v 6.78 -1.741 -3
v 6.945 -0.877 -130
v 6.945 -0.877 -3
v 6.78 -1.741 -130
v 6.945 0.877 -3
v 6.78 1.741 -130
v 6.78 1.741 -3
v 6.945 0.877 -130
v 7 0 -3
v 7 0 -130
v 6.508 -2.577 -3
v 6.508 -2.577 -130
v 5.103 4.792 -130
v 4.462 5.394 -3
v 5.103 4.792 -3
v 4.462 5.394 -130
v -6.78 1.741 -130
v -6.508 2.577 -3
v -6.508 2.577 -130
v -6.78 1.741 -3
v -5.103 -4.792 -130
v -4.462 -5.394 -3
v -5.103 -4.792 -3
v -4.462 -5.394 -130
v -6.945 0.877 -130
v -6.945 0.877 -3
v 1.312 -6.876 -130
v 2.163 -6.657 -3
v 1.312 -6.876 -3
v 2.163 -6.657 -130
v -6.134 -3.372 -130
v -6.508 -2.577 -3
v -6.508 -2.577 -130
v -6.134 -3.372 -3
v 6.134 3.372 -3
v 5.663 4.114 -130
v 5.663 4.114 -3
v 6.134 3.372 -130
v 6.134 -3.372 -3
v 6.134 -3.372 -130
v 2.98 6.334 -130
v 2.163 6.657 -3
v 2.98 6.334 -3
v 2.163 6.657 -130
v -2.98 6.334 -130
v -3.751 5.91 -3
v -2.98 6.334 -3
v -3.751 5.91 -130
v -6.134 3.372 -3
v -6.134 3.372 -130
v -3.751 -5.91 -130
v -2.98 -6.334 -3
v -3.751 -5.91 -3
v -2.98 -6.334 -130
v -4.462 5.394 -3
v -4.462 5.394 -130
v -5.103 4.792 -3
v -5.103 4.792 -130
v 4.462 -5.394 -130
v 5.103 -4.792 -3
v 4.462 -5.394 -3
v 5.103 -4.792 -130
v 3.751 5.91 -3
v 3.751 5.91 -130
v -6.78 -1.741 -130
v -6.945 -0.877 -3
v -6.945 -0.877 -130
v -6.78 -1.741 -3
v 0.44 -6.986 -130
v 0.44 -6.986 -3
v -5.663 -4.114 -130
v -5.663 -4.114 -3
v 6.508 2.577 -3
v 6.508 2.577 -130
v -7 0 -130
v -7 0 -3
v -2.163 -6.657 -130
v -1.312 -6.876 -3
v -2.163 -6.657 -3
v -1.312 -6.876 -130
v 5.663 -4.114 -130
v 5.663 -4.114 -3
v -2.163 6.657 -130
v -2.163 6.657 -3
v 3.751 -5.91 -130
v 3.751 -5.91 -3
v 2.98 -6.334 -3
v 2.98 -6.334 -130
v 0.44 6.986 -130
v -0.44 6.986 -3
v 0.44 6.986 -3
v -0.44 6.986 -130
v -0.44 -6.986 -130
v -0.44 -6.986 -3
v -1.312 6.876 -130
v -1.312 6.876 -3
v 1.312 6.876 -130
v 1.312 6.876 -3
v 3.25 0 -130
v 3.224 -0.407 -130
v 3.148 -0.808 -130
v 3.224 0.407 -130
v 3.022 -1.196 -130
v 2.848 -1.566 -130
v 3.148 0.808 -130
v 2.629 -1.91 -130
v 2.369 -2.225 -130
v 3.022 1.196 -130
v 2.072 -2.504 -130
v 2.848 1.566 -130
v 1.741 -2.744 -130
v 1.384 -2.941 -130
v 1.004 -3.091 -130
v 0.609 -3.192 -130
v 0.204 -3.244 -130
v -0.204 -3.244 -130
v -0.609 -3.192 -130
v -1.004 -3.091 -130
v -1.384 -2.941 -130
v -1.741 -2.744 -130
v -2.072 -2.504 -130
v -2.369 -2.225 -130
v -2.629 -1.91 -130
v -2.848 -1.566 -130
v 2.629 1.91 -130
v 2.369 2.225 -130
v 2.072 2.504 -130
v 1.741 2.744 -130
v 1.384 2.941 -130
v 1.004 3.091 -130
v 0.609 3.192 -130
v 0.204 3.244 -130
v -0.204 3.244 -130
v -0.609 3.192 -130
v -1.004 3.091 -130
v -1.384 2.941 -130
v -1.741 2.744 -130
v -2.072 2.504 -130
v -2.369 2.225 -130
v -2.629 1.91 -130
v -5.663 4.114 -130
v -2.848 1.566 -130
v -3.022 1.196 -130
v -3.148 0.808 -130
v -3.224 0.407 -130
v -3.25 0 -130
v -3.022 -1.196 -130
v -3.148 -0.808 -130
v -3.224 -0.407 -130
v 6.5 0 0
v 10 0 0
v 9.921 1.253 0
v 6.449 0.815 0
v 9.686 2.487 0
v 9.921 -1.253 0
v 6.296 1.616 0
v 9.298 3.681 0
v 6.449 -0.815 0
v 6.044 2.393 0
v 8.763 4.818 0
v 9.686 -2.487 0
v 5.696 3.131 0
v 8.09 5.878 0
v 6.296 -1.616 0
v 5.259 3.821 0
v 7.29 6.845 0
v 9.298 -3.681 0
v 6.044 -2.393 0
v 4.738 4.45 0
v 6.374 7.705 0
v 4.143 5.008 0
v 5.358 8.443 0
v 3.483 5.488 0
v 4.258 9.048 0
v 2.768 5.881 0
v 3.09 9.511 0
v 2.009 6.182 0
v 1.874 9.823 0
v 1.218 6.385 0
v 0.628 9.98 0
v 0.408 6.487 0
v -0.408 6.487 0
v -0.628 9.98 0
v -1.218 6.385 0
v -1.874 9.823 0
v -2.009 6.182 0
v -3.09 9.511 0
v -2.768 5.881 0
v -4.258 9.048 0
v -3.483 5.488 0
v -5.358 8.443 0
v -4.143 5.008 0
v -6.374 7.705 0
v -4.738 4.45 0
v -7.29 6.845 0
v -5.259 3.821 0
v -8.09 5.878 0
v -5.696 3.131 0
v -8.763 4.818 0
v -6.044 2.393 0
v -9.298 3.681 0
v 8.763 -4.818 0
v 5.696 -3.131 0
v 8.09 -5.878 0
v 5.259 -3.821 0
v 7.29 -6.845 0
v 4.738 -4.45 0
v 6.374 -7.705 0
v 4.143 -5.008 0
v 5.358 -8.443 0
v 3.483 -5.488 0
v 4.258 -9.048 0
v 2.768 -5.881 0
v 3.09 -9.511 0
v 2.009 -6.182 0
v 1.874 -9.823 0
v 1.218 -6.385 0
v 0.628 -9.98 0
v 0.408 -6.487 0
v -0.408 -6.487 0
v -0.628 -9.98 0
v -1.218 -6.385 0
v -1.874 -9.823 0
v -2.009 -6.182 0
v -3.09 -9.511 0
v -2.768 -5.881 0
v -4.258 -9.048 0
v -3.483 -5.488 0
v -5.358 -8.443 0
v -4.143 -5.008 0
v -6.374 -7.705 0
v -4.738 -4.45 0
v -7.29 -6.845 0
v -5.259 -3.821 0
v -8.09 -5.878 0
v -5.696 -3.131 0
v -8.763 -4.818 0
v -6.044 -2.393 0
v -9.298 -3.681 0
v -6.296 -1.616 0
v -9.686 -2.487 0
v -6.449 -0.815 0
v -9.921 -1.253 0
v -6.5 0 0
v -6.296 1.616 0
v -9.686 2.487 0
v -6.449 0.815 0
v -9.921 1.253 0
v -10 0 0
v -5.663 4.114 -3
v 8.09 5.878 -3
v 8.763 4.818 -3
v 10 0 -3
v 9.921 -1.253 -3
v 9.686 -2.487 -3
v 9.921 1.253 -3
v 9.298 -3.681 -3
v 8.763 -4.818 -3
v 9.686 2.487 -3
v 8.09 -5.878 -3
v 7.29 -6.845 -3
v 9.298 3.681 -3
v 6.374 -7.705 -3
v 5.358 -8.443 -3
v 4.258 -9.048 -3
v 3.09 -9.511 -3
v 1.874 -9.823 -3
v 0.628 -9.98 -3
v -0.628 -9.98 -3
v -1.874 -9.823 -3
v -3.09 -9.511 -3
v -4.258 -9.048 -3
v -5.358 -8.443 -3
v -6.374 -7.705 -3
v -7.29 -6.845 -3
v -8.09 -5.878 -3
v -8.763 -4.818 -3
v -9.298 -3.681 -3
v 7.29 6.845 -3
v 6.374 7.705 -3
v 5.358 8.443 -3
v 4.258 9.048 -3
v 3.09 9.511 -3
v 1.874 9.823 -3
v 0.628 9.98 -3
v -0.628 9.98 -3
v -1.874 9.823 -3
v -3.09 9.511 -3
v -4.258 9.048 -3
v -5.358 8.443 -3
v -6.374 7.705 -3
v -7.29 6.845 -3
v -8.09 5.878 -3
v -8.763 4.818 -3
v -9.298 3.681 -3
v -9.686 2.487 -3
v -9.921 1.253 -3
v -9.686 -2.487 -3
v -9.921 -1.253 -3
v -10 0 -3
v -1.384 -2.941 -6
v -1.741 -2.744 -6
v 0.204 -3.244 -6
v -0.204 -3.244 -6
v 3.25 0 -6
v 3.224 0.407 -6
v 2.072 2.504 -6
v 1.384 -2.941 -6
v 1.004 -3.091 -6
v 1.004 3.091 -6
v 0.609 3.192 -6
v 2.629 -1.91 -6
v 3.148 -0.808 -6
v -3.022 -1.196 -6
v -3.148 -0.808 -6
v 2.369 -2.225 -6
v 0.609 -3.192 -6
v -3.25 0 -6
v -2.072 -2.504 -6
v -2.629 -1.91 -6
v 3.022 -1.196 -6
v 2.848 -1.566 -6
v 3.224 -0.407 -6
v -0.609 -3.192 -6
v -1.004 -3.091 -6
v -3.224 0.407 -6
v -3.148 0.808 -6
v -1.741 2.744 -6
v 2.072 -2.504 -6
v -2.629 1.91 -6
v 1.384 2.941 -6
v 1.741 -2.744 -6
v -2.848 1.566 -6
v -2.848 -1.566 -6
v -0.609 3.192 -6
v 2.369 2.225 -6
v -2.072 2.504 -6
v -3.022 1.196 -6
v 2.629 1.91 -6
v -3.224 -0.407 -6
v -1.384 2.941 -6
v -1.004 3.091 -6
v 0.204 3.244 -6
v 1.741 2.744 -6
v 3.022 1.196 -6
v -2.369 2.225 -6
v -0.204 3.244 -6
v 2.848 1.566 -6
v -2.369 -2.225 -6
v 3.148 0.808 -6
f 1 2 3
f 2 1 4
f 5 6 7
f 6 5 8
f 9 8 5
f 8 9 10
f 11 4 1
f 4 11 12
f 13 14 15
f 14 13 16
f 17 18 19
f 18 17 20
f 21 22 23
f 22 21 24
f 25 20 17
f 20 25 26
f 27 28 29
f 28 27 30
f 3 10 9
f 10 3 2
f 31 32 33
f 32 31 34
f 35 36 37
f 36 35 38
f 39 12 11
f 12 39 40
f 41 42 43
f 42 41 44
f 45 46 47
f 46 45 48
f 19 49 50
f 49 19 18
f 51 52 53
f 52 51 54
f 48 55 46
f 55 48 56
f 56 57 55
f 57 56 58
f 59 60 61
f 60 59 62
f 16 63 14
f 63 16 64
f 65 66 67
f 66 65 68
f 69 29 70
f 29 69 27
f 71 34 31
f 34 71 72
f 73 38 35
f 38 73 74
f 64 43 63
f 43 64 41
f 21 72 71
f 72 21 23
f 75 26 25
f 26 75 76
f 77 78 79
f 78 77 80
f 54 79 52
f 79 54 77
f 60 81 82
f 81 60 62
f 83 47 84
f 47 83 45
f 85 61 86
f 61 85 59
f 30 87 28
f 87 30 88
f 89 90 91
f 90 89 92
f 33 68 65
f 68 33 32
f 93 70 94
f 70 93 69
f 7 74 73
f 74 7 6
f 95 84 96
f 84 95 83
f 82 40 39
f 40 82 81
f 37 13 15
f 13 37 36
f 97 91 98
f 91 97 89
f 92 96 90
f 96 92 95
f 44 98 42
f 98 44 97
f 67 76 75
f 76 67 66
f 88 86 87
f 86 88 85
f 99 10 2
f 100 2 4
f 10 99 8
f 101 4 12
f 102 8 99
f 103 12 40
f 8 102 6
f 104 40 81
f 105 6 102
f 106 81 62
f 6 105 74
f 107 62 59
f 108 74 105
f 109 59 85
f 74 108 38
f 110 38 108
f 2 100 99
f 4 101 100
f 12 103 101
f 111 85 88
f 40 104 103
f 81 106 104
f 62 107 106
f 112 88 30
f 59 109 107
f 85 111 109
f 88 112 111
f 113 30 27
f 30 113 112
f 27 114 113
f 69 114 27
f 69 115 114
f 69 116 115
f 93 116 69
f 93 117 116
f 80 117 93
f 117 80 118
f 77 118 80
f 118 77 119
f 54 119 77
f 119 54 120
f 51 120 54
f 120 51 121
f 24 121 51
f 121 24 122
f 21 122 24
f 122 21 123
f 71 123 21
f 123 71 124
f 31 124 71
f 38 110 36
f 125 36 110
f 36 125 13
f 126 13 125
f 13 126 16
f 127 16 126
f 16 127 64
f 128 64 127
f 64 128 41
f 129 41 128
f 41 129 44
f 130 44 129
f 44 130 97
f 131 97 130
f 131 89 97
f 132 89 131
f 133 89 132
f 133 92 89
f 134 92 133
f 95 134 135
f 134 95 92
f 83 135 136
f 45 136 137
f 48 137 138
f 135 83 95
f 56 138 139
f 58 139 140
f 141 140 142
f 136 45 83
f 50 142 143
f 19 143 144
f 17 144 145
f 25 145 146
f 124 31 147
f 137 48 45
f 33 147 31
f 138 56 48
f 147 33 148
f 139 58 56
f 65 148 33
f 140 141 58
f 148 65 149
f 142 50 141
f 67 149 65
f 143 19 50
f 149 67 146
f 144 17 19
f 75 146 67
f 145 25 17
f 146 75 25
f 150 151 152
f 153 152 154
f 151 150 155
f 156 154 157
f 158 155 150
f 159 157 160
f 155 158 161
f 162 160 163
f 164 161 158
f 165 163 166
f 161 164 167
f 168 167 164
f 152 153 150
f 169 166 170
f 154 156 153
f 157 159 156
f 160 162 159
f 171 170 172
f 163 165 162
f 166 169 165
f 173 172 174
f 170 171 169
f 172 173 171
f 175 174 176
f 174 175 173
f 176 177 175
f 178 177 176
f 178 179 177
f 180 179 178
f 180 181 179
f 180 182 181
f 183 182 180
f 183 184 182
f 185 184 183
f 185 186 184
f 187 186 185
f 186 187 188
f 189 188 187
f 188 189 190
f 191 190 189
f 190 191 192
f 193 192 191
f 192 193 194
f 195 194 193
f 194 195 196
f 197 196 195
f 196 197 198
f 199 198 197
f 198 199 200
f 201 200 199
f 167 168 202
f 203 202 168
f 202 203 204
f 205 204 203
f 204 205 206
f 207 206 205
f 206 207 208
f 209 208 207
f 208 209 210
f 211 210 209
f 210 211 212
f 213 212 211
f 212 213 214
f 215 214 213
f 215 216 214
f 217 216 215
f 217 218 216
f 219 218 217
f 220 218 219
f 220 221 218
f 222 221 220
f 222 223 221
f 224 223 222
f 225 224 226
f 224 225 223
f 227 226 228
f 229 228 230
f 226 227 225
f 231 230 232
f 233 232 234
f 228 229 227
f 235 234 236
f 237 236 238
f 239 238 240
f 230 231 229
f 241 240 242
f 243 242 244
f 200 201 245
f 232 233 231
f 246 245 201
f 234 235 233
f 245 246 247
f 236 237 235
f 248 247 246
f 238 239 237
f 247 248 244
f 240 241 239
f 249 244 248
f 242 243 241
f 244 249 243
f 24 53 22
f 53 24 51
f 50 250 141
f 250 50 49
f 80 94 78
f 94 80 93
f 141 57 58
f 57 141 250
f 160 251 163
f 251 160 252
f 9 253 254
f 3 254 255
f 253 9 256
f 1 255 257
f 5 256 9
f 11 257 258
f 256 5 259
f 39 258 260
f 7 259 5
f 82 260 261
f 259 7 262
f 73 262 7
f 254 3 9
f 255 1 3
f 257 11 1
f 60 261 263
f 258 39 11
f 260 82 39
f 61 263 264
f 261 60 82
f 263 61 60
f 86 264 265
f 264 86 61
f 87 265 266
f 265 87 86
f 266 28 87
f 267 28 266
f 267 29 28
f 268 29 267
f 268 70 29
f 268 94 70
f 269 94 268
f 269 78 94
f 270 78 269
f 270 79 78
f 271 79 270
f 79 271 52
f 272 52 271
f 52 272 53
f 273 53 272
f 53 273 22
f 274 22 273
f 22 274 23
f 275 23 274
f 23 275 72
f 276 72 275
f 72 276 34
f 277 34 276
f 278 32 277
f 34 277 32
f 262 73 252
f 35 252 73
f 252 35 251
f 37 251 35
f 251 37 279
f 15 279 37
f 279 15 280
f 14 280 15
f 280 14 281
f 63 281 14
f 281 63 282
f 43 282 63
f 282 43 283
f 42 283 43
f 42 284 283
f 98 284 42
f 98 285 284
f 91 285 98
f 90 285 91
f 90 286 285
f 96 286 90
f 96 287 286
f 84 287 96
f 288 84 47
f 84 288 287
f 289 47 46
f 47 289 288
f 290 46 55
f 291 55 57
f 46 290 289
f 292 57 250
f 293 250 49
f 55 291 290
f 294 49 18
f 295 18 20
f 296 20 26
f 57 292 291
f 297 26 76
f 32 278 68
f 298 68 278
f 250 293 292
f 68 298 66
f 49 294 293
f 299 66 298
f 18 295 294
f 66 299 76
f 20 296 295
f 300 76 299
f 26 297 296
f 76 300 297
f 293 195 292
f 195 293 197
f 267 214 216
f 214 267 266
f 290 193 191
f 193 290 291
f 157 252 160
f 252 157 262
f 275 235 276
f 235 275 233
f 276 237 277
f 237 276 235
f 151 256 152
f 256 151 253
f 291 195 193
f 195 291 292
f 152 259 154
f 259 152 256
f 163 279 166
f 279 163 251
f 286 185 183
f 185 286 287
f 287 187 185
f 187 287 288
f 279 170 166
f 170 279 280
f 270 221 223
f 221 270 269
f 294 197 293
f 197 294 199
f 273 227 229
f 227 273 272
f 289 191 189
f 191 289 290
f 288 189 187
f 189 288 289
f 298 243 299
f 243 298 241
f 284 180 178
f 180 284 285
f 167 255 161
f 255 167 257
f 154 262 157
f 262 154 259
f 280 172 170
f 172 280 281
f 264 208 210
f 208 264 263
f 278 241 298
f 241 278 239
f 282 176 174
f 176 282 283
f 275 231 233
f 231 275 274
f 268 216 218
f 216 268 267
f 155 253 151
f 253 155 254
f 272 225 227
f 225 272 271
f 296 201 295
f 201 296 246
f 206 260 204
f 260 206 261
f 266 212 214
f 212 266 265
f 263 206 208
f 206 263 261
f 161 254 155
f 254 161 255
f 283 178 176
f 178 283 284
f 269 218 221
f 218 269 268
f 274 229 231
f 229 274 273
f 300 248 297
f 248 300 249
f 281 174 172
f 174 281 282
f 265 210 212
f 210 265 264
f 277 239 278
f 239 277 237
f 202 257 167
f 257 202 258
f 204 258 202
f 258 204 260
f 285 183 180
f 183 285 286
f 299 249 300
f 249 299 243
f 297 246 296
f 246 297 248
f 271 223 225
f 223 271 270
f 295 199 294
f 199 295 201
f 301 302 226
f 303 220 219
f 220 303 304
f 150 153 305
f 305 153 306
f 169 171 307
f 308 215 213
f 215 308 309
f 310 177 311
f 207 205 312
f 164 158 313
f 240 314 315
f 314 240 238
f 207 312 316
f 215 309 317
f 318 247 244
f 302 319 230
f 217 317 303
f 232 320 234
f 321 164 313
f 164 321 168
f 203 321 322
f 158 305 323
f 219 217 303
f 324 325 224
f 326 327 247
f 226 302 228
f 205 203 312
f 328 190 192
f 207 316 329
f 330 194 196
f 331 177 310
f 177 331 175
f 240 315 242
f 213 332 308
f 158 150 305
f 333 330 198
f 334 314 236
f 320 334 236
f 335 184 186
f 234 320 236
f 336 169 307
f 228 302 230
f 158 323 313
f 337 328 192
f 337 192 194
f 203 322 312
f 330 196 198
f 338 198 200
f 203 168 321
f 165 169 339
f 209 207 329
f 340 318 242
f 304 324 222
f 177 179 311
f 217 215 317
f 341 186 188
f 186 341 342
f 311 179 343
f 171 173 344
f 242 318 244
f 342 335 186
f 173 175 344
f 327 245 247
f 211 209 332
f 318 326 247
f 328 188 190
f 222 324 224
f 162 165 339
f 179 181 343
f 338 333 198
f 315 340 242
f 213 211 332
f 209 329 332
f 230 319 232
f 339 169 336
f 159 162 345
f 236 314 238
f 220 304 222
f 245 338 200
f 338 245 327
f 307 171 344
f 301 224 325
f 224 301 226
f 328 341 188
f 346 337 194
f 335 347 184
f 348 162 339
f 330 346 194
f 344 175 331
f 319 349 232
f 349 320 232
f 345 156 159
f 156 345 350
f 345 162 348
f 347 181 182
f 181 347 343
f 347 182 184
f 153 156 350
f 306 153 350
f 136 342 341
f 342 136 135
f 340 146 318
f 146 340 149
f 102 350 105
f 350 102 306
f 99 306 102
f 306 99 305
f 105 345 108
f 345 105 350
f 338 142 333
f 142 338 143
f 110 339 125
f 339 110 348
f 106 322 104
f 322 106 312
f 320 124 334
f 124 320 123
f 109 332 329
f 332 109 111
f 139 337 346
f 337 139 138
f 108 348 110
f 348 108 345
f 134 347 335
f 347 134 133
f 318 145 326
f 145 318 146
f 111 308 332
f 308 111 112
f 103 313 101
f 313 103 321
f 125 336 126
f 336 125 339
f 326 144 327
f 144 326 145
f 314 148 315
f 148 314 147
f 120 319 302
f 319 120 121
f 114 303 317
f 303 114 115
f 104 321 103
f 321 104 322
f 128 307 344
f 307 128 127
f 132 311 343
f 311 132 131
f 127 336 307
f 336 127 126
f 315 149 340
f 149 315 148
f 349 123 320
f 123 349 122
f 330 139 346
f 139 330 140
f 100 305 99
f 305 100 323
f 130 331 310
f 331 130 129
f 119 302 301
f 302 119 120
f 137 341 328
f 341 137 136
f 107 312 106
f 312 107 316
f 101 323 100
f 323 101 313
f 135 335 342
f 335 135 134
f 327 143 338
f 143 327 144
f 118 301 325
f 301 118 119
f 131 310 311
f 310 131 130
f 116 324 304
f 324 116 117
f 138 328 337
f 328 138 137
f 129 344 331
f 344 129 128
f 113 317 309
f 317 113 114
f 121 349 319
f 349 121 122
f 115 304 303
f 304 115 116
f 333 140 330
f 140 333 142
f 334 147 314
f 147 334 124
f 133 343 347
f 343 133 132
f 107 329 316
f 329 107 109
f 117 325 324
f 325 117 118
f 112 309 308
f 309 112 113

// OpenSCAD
$fn = 50;


difference() {
	union() {
		translate(v = [0, 0, -130.0000000000]) {
			cylinder(h = 130, r = 7.0000000000);
		}
		translate(v = [0, 0, -3.0000000000]) {
			cylinder(h = 3, r = 10.0000000000);
		}
	}
	union() {
		translate(v = [0, 0, 0]) {
			rotate(a = [0, 0, 0]) {
				difference() {
					union() {
						#translate(v = [0, 0, -130.0000000000]) {
							cylinder(h = 130, r = 2.2500000000);
						}
						#translate(v = [0, 0, -6]) {
							cylinder(h = 6, r = 7.0000000000, r1 = 3.2500000000, r2 = 6.5000000000);
						}
						#translate(v = [0, 0, -130.0000000000]) {
							cylinder(h = 130, r = 3.2500000000);
						}
						#translate(v = [0, 0, -130.0000000000]) {
							cylinder(h = 130, r = 2.2500000000);
						}
					}
					union();
				}
			}
		}
	}
}
